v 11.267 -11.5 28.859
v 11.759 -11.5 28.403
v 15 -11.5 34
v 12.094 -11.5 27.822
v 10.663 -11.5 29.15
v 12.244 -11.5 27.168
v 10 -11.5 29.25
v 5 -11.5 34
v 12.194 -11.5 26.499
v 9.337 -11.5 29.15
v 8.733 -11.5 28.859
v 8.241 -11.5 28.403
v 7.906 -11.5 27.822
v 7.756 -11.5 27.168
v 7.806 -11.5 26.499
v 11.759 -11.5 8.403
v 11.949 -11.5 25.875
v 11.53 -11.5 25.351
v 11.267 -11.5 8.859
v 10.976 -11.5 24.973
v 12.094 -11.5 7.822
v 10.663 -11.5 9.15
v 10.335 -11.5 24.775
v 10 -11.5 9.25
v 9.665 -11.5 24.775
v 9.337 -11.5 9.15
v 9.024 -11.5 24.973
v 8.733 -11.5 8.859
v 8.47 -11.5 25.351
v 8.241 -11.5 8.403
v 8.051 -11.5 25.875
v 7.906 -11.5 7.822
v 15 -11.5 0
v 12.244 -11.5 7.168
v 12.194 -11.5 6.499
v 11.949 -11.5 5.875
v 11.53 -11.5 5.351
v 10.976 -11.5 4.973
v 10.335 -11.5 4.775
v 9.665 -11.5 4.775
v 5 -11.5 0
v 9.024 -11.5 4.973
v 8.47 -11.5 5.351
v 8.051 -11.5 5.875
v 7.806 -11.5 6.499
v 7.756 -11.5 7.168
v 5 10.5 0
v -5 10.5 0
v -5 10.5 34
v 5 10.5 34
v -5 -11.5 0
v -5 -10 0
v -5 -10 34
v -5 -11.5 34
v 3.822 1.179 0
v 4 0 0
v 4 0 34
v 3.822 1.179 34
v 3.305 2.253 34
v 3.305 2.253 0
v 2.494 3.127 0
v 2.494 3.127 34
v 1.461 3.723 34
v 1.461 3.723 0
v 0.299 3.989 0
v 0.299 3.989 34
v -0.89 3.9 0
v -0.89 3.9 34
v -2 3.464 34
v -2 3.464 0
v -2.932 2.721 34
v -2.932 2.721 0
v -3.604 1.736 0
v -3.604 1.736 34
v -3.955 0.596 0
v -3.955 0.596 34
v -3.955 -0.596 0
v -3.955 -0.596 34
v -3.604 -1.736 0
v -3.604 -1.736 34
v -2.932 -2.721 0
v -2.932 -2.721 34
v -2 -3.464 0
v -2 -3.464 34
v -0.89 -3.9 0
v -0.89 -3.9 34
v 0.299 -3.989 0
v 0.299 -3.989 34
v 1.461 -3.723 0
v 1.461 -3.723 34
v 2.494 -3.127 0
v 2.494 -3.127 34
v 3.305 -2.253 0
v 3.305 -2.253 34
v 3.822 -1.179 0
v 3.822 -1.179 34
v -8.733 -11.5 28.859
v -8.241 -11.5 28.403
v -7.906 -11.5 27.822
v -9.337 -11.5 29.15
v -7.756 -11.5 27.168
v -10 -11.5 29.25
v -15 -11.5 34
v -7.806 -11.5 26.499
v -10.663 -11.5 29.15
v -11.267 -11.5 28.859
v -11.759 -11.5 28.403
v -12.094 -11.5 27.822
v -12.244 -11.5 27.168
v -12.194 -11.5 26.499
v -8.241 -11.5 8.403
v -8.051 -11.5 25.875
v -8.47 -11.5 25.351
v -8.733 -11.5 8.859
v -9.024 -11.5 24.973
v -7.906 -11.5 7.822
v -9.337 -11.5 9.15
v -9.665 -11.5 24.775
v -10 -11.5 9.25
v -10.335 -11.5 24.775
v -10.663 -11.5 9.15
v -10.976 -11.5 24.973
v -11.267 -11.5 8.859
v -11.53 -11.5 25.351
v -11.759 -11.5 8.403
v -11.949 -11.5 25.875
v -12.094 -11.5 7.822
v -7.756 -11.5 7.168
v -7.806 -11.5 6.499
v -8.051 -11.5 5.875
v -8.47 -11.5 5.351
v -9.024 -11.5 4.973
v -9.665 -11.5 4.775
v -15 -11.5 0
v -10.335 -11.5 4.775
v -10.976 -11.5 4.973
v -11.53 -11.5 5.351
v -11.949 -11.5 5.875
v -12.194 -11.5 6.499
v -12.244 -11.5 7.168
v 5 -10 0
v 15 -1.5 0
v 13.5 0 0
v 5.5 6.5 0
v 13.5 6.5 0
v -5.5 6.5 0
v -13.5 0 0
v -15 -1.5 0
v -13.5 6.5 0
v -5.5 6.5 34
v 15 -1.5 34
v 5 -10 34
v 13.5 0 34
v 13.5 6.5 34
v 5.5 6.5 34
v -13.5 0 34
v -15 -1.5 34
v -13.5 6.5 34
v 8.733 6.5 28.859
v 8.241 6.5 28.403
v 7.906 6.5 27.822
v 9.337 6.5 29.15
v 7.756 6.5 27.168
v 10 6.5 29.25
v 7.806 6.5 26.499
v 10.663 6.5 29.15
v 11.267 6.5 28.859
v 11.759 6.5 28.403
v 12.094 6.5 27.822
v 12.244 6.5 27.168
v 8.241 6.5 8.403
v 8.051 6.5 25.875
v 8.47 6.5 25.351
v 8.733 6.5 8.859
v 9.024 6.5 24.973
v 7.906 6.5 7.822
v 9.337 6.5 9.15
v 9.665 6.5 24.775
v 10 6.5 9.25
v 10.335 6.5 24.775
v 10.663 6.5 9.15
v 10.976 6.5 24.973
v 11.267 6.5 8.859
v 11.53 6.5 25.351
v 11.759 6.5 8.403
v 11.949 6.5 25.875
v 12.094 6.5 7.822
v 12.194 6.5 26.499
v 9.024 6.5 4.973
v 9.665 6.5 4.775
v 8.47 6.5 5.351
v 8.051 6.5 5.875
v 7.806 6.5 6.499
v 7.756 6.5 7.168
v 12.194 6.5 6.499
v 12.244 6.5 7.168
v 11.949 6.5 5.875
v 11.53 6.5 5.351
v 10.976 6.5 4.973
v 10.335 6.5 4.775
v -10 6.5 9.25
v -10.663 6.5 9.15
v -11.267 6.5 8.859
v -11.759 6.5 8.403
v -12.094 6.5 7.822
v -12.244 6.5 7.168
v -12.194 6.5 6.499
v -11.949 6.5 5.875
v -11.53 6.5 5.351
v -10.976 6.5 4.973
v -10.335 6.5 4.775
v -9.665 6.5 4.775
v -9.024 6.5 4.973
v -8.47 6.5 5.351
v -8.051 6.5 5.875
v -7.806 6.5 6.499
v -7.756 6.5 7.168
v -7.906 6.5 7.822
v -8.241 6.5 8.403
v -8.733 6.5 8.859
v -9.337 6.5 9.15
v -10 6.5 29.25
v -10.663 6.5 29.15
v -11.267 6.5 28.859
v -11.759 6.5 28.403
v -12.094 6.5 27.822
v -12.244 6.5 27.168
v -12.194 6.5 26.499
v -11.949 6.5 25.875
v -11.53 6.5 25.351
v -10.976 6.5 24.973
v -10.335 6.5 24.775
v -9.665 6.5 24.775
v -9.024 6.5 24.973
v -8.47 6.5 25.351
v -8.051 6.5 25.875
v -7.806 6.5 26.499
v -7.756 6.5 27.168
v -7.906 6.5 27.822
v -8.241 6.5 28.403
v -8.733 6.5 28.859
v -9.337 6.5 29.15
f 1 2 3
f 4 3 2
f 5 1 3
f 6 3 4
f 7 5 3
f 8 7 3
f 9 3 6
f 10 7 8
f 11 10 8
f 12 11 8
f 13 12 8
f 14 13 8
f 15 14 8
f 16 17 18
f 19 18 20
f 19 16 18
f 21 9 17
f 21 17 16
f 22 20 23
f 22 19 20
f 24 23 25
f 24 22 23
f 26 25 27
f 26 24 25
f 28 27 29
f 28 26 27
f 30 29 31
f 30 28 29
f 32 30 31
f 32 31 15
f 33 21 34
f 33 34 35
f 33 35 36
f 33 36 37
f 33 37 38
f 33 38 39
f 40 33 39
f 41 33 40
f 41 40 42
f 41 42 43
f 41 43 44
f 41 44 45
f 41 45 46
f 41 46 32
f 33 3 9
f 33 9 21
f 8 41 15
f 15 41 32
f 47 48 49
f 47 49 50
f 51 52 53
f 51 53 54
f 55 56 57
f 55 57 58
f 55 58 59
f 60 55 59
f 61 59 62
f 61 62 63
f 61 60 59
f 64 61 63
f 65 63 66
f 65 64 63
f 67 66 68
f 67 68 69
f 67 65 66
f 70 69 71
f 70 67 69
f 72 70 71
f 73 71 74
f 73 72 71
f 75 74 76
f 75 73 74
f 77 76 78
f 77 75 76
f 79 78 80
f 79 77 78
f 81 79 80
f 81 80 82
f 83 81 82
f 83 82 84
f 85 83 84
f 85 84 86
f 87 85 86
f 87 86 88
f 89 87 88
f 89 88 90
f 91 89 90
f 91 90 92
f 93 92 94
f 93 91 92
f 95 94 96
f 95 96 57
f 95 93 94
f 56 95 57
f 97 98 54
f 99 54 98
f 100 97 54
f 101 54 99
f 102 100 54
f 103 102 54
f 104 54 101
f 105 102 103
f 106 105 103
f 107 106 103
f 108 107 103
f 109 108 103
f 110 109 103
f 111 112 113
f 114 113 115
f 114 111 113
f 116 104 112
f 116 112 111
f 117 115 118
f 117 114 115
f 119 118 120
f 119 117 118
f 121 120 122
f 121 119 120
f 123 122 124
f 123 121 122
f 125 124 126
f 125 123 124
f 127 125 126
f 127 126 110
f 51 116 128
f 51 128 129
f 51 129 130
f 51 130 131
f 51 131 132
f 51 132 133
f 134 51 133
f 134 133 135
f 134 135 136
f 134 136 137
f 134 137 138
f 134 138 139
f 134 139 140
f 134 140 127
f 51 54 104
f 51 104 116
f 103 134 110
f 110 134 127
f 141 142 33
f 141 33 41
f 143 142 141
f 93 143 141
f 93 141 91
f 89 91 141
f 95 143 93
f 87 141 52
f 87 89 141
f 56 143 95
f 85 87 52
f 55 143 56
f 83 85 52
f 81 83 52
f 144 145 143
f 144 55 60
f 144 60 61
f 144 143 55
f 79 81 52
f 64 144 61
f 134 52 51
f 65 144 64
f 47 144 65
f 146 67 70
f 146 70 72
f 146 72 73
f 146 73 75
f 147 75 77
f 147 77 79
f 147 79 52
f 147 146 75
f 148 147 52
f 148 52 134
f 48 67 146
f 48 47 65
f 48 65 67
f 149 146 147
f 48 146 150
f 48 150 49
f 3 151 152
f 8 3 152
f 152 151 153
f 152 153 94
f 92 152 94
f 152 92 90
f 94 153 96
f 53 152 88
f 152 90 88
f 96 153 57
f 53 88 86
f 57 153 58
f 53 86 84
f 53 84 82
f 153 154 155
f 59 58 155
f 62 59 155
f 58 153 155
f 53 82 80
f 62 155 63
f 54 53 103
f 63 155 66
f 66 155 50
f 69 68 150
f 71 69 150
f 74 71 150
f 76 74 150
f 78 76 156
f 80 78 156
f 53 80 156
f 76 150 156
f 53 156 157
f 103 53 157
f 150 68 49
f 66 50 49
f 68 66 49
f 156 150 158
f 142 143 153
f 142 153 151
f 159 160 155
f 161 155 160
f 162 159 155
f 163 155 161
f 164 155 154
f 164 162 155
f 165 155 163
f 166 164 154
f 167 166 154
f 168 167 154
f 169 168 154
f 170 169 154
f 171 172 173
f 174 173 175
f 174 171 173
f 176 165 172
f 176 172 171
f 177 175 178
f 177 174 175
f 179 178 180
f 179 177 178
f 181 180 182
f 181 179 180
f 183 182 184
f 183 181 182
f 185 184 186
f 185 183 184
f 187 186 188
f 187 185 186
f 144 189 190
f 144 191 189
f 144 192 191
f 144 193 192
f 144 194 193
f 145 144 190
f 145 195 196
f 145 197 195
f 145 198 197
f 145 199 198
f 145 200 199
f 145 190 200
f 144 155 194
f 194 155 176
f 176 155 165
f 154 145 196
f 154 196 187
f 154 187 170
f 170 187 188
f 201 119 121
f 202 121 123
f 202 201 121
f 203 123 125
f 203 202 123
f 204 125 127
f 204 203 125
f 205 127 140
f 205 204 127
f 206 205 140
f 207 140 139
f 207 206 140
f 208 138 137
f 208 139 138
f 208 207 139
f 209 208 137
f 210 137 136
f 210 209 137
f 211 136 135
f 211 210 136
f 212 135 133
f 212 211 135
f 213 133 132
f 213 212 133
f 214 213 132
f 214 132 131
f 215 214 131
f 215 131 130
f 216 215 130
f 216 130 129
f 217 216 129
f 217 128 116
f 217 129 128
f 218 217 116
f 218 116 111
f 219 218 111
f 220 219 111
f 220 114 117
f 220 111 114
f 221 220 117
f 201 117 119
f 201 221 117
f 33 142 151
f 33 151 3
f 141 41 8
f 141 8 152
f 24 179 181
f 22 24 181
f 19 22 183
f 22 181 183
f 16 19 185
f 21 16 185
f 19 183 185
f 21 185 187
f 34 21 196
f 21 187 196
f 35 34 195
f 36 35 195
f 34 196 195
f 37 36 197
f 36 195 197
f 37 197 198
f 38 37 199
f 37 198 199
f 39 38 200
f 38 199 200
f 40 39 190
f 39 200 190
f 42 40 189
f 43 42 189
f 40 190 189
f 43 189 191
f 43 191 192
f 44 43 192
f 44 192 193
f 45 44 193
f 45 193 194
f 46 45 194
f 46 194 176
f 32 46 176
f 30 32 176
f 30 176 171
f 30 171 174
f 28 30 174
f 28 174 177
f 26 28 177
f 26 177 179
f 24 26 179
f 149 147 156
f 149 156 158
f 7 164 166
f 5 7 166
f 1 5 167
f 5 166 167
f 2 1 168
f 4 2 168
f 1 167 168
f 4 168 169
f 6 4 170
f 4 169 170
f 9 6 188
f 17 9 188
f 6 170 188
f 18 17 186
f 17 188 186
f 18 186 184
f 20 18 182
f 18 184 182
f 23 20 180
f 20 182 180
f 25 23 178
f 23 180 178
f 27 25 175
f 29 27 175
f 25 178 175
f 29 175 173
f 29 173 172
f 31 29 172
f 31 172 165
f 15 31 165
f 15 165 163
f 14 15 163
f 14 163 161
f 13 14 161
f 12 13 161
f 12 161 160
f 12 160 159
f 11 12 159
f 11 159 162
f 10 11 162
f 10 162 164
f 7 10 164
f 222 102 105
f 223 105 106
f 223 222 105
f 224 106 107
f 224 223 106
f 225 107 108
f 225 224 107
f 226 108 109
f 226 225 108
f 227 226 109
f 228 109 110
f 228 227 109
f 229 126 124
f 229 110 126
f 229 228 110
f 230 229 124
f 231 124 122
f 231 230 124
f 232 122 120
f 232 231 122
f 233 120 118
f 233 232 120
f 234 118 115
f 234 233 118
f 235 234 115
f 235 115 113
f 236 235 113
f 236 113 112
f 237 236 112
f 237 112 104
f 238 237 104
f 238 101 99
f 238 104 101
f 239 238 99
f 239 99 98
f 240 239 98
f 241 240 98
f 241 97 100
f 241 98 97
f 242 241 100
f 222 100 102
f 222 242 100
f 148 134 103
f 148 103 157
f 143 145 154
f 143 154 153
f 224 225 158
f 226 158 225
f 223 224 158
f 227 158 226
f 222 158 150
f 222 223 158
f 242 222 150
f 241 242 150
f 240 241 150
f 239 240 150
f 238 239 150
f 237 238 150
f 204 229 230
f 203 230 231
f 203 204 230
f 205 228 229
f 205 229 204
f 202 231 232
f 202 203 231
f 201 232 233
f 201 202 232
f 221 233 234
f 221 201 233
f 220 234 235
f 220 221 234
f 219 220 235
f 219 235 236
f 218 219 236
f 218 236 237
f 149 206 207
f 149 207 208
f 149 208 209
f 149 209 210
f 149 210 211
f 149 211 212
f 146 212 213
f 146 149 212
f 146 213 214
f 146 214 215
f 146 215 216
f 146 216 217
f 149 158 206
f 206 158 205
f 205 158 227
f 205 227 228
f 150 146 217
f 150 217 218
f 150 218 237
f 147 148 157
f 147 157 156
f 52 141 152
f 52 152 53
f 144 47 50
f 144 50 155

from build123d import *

# Parameters (mm, degrees)
SKETCH1_R           = 4
BOSS_EXTRUDE1_DEPTH = 34
SKETCH2_R           = 2.25
CUT_EXTRUDE1_DEPTH  = 42.291645644


with BuildPart() as part:
    # Sketch1 → Boss-Extrude1 (new body)
    with BuildSketch(Plane.XY):
        Polygon((5, -10), (-5, -10), (-5, -11.5), (-15, -11.5), (-15, -1.5), (-13.5, 0), (-13.5, 6.5), (-5.5, 6.5), (-5, 10.5), (5, 10.5), (5.5, 6.5), (13.5, 6.5), (13.5, 0), (15, -1.5), (15, -11.5), (5, -11.5), align=None)
        Circle(SKETCH1_R, mode=Mode.SUBTRACT)
    extrude(amount=BOSS_EXTRUDE1_DEPTH)

    # Sketch2 → Cut-Extrude1 (cut, through all)
    with BuildSketch(Plane(origin=(0, 6.5, 0), x_dir=(1, 0, 0), z_dir=(0, 1, 0))):
        with Locations(Location((10, -27, 0), (0, 0, 270))):
            Circle(SKETCH2_R)
        with Locations(Location((10, -7, 0), (0, 0, 270))):
            Circle(SKETCH2_R)
    cut_extrude1 = extrude(amount=-CUT_EXTRUDE1_DEPTH, mode=Mode.SUBTRACT)

    # Mirror1: Cut-Extrude1 across plane
    add(cut_extrude1.mirror(Plane(origin=(0, 0, 0), x_dir=(0, 0, 1), z_dir=(1, 0, 0))), mode=Mode.SUBTRACT)


solid = part.part
